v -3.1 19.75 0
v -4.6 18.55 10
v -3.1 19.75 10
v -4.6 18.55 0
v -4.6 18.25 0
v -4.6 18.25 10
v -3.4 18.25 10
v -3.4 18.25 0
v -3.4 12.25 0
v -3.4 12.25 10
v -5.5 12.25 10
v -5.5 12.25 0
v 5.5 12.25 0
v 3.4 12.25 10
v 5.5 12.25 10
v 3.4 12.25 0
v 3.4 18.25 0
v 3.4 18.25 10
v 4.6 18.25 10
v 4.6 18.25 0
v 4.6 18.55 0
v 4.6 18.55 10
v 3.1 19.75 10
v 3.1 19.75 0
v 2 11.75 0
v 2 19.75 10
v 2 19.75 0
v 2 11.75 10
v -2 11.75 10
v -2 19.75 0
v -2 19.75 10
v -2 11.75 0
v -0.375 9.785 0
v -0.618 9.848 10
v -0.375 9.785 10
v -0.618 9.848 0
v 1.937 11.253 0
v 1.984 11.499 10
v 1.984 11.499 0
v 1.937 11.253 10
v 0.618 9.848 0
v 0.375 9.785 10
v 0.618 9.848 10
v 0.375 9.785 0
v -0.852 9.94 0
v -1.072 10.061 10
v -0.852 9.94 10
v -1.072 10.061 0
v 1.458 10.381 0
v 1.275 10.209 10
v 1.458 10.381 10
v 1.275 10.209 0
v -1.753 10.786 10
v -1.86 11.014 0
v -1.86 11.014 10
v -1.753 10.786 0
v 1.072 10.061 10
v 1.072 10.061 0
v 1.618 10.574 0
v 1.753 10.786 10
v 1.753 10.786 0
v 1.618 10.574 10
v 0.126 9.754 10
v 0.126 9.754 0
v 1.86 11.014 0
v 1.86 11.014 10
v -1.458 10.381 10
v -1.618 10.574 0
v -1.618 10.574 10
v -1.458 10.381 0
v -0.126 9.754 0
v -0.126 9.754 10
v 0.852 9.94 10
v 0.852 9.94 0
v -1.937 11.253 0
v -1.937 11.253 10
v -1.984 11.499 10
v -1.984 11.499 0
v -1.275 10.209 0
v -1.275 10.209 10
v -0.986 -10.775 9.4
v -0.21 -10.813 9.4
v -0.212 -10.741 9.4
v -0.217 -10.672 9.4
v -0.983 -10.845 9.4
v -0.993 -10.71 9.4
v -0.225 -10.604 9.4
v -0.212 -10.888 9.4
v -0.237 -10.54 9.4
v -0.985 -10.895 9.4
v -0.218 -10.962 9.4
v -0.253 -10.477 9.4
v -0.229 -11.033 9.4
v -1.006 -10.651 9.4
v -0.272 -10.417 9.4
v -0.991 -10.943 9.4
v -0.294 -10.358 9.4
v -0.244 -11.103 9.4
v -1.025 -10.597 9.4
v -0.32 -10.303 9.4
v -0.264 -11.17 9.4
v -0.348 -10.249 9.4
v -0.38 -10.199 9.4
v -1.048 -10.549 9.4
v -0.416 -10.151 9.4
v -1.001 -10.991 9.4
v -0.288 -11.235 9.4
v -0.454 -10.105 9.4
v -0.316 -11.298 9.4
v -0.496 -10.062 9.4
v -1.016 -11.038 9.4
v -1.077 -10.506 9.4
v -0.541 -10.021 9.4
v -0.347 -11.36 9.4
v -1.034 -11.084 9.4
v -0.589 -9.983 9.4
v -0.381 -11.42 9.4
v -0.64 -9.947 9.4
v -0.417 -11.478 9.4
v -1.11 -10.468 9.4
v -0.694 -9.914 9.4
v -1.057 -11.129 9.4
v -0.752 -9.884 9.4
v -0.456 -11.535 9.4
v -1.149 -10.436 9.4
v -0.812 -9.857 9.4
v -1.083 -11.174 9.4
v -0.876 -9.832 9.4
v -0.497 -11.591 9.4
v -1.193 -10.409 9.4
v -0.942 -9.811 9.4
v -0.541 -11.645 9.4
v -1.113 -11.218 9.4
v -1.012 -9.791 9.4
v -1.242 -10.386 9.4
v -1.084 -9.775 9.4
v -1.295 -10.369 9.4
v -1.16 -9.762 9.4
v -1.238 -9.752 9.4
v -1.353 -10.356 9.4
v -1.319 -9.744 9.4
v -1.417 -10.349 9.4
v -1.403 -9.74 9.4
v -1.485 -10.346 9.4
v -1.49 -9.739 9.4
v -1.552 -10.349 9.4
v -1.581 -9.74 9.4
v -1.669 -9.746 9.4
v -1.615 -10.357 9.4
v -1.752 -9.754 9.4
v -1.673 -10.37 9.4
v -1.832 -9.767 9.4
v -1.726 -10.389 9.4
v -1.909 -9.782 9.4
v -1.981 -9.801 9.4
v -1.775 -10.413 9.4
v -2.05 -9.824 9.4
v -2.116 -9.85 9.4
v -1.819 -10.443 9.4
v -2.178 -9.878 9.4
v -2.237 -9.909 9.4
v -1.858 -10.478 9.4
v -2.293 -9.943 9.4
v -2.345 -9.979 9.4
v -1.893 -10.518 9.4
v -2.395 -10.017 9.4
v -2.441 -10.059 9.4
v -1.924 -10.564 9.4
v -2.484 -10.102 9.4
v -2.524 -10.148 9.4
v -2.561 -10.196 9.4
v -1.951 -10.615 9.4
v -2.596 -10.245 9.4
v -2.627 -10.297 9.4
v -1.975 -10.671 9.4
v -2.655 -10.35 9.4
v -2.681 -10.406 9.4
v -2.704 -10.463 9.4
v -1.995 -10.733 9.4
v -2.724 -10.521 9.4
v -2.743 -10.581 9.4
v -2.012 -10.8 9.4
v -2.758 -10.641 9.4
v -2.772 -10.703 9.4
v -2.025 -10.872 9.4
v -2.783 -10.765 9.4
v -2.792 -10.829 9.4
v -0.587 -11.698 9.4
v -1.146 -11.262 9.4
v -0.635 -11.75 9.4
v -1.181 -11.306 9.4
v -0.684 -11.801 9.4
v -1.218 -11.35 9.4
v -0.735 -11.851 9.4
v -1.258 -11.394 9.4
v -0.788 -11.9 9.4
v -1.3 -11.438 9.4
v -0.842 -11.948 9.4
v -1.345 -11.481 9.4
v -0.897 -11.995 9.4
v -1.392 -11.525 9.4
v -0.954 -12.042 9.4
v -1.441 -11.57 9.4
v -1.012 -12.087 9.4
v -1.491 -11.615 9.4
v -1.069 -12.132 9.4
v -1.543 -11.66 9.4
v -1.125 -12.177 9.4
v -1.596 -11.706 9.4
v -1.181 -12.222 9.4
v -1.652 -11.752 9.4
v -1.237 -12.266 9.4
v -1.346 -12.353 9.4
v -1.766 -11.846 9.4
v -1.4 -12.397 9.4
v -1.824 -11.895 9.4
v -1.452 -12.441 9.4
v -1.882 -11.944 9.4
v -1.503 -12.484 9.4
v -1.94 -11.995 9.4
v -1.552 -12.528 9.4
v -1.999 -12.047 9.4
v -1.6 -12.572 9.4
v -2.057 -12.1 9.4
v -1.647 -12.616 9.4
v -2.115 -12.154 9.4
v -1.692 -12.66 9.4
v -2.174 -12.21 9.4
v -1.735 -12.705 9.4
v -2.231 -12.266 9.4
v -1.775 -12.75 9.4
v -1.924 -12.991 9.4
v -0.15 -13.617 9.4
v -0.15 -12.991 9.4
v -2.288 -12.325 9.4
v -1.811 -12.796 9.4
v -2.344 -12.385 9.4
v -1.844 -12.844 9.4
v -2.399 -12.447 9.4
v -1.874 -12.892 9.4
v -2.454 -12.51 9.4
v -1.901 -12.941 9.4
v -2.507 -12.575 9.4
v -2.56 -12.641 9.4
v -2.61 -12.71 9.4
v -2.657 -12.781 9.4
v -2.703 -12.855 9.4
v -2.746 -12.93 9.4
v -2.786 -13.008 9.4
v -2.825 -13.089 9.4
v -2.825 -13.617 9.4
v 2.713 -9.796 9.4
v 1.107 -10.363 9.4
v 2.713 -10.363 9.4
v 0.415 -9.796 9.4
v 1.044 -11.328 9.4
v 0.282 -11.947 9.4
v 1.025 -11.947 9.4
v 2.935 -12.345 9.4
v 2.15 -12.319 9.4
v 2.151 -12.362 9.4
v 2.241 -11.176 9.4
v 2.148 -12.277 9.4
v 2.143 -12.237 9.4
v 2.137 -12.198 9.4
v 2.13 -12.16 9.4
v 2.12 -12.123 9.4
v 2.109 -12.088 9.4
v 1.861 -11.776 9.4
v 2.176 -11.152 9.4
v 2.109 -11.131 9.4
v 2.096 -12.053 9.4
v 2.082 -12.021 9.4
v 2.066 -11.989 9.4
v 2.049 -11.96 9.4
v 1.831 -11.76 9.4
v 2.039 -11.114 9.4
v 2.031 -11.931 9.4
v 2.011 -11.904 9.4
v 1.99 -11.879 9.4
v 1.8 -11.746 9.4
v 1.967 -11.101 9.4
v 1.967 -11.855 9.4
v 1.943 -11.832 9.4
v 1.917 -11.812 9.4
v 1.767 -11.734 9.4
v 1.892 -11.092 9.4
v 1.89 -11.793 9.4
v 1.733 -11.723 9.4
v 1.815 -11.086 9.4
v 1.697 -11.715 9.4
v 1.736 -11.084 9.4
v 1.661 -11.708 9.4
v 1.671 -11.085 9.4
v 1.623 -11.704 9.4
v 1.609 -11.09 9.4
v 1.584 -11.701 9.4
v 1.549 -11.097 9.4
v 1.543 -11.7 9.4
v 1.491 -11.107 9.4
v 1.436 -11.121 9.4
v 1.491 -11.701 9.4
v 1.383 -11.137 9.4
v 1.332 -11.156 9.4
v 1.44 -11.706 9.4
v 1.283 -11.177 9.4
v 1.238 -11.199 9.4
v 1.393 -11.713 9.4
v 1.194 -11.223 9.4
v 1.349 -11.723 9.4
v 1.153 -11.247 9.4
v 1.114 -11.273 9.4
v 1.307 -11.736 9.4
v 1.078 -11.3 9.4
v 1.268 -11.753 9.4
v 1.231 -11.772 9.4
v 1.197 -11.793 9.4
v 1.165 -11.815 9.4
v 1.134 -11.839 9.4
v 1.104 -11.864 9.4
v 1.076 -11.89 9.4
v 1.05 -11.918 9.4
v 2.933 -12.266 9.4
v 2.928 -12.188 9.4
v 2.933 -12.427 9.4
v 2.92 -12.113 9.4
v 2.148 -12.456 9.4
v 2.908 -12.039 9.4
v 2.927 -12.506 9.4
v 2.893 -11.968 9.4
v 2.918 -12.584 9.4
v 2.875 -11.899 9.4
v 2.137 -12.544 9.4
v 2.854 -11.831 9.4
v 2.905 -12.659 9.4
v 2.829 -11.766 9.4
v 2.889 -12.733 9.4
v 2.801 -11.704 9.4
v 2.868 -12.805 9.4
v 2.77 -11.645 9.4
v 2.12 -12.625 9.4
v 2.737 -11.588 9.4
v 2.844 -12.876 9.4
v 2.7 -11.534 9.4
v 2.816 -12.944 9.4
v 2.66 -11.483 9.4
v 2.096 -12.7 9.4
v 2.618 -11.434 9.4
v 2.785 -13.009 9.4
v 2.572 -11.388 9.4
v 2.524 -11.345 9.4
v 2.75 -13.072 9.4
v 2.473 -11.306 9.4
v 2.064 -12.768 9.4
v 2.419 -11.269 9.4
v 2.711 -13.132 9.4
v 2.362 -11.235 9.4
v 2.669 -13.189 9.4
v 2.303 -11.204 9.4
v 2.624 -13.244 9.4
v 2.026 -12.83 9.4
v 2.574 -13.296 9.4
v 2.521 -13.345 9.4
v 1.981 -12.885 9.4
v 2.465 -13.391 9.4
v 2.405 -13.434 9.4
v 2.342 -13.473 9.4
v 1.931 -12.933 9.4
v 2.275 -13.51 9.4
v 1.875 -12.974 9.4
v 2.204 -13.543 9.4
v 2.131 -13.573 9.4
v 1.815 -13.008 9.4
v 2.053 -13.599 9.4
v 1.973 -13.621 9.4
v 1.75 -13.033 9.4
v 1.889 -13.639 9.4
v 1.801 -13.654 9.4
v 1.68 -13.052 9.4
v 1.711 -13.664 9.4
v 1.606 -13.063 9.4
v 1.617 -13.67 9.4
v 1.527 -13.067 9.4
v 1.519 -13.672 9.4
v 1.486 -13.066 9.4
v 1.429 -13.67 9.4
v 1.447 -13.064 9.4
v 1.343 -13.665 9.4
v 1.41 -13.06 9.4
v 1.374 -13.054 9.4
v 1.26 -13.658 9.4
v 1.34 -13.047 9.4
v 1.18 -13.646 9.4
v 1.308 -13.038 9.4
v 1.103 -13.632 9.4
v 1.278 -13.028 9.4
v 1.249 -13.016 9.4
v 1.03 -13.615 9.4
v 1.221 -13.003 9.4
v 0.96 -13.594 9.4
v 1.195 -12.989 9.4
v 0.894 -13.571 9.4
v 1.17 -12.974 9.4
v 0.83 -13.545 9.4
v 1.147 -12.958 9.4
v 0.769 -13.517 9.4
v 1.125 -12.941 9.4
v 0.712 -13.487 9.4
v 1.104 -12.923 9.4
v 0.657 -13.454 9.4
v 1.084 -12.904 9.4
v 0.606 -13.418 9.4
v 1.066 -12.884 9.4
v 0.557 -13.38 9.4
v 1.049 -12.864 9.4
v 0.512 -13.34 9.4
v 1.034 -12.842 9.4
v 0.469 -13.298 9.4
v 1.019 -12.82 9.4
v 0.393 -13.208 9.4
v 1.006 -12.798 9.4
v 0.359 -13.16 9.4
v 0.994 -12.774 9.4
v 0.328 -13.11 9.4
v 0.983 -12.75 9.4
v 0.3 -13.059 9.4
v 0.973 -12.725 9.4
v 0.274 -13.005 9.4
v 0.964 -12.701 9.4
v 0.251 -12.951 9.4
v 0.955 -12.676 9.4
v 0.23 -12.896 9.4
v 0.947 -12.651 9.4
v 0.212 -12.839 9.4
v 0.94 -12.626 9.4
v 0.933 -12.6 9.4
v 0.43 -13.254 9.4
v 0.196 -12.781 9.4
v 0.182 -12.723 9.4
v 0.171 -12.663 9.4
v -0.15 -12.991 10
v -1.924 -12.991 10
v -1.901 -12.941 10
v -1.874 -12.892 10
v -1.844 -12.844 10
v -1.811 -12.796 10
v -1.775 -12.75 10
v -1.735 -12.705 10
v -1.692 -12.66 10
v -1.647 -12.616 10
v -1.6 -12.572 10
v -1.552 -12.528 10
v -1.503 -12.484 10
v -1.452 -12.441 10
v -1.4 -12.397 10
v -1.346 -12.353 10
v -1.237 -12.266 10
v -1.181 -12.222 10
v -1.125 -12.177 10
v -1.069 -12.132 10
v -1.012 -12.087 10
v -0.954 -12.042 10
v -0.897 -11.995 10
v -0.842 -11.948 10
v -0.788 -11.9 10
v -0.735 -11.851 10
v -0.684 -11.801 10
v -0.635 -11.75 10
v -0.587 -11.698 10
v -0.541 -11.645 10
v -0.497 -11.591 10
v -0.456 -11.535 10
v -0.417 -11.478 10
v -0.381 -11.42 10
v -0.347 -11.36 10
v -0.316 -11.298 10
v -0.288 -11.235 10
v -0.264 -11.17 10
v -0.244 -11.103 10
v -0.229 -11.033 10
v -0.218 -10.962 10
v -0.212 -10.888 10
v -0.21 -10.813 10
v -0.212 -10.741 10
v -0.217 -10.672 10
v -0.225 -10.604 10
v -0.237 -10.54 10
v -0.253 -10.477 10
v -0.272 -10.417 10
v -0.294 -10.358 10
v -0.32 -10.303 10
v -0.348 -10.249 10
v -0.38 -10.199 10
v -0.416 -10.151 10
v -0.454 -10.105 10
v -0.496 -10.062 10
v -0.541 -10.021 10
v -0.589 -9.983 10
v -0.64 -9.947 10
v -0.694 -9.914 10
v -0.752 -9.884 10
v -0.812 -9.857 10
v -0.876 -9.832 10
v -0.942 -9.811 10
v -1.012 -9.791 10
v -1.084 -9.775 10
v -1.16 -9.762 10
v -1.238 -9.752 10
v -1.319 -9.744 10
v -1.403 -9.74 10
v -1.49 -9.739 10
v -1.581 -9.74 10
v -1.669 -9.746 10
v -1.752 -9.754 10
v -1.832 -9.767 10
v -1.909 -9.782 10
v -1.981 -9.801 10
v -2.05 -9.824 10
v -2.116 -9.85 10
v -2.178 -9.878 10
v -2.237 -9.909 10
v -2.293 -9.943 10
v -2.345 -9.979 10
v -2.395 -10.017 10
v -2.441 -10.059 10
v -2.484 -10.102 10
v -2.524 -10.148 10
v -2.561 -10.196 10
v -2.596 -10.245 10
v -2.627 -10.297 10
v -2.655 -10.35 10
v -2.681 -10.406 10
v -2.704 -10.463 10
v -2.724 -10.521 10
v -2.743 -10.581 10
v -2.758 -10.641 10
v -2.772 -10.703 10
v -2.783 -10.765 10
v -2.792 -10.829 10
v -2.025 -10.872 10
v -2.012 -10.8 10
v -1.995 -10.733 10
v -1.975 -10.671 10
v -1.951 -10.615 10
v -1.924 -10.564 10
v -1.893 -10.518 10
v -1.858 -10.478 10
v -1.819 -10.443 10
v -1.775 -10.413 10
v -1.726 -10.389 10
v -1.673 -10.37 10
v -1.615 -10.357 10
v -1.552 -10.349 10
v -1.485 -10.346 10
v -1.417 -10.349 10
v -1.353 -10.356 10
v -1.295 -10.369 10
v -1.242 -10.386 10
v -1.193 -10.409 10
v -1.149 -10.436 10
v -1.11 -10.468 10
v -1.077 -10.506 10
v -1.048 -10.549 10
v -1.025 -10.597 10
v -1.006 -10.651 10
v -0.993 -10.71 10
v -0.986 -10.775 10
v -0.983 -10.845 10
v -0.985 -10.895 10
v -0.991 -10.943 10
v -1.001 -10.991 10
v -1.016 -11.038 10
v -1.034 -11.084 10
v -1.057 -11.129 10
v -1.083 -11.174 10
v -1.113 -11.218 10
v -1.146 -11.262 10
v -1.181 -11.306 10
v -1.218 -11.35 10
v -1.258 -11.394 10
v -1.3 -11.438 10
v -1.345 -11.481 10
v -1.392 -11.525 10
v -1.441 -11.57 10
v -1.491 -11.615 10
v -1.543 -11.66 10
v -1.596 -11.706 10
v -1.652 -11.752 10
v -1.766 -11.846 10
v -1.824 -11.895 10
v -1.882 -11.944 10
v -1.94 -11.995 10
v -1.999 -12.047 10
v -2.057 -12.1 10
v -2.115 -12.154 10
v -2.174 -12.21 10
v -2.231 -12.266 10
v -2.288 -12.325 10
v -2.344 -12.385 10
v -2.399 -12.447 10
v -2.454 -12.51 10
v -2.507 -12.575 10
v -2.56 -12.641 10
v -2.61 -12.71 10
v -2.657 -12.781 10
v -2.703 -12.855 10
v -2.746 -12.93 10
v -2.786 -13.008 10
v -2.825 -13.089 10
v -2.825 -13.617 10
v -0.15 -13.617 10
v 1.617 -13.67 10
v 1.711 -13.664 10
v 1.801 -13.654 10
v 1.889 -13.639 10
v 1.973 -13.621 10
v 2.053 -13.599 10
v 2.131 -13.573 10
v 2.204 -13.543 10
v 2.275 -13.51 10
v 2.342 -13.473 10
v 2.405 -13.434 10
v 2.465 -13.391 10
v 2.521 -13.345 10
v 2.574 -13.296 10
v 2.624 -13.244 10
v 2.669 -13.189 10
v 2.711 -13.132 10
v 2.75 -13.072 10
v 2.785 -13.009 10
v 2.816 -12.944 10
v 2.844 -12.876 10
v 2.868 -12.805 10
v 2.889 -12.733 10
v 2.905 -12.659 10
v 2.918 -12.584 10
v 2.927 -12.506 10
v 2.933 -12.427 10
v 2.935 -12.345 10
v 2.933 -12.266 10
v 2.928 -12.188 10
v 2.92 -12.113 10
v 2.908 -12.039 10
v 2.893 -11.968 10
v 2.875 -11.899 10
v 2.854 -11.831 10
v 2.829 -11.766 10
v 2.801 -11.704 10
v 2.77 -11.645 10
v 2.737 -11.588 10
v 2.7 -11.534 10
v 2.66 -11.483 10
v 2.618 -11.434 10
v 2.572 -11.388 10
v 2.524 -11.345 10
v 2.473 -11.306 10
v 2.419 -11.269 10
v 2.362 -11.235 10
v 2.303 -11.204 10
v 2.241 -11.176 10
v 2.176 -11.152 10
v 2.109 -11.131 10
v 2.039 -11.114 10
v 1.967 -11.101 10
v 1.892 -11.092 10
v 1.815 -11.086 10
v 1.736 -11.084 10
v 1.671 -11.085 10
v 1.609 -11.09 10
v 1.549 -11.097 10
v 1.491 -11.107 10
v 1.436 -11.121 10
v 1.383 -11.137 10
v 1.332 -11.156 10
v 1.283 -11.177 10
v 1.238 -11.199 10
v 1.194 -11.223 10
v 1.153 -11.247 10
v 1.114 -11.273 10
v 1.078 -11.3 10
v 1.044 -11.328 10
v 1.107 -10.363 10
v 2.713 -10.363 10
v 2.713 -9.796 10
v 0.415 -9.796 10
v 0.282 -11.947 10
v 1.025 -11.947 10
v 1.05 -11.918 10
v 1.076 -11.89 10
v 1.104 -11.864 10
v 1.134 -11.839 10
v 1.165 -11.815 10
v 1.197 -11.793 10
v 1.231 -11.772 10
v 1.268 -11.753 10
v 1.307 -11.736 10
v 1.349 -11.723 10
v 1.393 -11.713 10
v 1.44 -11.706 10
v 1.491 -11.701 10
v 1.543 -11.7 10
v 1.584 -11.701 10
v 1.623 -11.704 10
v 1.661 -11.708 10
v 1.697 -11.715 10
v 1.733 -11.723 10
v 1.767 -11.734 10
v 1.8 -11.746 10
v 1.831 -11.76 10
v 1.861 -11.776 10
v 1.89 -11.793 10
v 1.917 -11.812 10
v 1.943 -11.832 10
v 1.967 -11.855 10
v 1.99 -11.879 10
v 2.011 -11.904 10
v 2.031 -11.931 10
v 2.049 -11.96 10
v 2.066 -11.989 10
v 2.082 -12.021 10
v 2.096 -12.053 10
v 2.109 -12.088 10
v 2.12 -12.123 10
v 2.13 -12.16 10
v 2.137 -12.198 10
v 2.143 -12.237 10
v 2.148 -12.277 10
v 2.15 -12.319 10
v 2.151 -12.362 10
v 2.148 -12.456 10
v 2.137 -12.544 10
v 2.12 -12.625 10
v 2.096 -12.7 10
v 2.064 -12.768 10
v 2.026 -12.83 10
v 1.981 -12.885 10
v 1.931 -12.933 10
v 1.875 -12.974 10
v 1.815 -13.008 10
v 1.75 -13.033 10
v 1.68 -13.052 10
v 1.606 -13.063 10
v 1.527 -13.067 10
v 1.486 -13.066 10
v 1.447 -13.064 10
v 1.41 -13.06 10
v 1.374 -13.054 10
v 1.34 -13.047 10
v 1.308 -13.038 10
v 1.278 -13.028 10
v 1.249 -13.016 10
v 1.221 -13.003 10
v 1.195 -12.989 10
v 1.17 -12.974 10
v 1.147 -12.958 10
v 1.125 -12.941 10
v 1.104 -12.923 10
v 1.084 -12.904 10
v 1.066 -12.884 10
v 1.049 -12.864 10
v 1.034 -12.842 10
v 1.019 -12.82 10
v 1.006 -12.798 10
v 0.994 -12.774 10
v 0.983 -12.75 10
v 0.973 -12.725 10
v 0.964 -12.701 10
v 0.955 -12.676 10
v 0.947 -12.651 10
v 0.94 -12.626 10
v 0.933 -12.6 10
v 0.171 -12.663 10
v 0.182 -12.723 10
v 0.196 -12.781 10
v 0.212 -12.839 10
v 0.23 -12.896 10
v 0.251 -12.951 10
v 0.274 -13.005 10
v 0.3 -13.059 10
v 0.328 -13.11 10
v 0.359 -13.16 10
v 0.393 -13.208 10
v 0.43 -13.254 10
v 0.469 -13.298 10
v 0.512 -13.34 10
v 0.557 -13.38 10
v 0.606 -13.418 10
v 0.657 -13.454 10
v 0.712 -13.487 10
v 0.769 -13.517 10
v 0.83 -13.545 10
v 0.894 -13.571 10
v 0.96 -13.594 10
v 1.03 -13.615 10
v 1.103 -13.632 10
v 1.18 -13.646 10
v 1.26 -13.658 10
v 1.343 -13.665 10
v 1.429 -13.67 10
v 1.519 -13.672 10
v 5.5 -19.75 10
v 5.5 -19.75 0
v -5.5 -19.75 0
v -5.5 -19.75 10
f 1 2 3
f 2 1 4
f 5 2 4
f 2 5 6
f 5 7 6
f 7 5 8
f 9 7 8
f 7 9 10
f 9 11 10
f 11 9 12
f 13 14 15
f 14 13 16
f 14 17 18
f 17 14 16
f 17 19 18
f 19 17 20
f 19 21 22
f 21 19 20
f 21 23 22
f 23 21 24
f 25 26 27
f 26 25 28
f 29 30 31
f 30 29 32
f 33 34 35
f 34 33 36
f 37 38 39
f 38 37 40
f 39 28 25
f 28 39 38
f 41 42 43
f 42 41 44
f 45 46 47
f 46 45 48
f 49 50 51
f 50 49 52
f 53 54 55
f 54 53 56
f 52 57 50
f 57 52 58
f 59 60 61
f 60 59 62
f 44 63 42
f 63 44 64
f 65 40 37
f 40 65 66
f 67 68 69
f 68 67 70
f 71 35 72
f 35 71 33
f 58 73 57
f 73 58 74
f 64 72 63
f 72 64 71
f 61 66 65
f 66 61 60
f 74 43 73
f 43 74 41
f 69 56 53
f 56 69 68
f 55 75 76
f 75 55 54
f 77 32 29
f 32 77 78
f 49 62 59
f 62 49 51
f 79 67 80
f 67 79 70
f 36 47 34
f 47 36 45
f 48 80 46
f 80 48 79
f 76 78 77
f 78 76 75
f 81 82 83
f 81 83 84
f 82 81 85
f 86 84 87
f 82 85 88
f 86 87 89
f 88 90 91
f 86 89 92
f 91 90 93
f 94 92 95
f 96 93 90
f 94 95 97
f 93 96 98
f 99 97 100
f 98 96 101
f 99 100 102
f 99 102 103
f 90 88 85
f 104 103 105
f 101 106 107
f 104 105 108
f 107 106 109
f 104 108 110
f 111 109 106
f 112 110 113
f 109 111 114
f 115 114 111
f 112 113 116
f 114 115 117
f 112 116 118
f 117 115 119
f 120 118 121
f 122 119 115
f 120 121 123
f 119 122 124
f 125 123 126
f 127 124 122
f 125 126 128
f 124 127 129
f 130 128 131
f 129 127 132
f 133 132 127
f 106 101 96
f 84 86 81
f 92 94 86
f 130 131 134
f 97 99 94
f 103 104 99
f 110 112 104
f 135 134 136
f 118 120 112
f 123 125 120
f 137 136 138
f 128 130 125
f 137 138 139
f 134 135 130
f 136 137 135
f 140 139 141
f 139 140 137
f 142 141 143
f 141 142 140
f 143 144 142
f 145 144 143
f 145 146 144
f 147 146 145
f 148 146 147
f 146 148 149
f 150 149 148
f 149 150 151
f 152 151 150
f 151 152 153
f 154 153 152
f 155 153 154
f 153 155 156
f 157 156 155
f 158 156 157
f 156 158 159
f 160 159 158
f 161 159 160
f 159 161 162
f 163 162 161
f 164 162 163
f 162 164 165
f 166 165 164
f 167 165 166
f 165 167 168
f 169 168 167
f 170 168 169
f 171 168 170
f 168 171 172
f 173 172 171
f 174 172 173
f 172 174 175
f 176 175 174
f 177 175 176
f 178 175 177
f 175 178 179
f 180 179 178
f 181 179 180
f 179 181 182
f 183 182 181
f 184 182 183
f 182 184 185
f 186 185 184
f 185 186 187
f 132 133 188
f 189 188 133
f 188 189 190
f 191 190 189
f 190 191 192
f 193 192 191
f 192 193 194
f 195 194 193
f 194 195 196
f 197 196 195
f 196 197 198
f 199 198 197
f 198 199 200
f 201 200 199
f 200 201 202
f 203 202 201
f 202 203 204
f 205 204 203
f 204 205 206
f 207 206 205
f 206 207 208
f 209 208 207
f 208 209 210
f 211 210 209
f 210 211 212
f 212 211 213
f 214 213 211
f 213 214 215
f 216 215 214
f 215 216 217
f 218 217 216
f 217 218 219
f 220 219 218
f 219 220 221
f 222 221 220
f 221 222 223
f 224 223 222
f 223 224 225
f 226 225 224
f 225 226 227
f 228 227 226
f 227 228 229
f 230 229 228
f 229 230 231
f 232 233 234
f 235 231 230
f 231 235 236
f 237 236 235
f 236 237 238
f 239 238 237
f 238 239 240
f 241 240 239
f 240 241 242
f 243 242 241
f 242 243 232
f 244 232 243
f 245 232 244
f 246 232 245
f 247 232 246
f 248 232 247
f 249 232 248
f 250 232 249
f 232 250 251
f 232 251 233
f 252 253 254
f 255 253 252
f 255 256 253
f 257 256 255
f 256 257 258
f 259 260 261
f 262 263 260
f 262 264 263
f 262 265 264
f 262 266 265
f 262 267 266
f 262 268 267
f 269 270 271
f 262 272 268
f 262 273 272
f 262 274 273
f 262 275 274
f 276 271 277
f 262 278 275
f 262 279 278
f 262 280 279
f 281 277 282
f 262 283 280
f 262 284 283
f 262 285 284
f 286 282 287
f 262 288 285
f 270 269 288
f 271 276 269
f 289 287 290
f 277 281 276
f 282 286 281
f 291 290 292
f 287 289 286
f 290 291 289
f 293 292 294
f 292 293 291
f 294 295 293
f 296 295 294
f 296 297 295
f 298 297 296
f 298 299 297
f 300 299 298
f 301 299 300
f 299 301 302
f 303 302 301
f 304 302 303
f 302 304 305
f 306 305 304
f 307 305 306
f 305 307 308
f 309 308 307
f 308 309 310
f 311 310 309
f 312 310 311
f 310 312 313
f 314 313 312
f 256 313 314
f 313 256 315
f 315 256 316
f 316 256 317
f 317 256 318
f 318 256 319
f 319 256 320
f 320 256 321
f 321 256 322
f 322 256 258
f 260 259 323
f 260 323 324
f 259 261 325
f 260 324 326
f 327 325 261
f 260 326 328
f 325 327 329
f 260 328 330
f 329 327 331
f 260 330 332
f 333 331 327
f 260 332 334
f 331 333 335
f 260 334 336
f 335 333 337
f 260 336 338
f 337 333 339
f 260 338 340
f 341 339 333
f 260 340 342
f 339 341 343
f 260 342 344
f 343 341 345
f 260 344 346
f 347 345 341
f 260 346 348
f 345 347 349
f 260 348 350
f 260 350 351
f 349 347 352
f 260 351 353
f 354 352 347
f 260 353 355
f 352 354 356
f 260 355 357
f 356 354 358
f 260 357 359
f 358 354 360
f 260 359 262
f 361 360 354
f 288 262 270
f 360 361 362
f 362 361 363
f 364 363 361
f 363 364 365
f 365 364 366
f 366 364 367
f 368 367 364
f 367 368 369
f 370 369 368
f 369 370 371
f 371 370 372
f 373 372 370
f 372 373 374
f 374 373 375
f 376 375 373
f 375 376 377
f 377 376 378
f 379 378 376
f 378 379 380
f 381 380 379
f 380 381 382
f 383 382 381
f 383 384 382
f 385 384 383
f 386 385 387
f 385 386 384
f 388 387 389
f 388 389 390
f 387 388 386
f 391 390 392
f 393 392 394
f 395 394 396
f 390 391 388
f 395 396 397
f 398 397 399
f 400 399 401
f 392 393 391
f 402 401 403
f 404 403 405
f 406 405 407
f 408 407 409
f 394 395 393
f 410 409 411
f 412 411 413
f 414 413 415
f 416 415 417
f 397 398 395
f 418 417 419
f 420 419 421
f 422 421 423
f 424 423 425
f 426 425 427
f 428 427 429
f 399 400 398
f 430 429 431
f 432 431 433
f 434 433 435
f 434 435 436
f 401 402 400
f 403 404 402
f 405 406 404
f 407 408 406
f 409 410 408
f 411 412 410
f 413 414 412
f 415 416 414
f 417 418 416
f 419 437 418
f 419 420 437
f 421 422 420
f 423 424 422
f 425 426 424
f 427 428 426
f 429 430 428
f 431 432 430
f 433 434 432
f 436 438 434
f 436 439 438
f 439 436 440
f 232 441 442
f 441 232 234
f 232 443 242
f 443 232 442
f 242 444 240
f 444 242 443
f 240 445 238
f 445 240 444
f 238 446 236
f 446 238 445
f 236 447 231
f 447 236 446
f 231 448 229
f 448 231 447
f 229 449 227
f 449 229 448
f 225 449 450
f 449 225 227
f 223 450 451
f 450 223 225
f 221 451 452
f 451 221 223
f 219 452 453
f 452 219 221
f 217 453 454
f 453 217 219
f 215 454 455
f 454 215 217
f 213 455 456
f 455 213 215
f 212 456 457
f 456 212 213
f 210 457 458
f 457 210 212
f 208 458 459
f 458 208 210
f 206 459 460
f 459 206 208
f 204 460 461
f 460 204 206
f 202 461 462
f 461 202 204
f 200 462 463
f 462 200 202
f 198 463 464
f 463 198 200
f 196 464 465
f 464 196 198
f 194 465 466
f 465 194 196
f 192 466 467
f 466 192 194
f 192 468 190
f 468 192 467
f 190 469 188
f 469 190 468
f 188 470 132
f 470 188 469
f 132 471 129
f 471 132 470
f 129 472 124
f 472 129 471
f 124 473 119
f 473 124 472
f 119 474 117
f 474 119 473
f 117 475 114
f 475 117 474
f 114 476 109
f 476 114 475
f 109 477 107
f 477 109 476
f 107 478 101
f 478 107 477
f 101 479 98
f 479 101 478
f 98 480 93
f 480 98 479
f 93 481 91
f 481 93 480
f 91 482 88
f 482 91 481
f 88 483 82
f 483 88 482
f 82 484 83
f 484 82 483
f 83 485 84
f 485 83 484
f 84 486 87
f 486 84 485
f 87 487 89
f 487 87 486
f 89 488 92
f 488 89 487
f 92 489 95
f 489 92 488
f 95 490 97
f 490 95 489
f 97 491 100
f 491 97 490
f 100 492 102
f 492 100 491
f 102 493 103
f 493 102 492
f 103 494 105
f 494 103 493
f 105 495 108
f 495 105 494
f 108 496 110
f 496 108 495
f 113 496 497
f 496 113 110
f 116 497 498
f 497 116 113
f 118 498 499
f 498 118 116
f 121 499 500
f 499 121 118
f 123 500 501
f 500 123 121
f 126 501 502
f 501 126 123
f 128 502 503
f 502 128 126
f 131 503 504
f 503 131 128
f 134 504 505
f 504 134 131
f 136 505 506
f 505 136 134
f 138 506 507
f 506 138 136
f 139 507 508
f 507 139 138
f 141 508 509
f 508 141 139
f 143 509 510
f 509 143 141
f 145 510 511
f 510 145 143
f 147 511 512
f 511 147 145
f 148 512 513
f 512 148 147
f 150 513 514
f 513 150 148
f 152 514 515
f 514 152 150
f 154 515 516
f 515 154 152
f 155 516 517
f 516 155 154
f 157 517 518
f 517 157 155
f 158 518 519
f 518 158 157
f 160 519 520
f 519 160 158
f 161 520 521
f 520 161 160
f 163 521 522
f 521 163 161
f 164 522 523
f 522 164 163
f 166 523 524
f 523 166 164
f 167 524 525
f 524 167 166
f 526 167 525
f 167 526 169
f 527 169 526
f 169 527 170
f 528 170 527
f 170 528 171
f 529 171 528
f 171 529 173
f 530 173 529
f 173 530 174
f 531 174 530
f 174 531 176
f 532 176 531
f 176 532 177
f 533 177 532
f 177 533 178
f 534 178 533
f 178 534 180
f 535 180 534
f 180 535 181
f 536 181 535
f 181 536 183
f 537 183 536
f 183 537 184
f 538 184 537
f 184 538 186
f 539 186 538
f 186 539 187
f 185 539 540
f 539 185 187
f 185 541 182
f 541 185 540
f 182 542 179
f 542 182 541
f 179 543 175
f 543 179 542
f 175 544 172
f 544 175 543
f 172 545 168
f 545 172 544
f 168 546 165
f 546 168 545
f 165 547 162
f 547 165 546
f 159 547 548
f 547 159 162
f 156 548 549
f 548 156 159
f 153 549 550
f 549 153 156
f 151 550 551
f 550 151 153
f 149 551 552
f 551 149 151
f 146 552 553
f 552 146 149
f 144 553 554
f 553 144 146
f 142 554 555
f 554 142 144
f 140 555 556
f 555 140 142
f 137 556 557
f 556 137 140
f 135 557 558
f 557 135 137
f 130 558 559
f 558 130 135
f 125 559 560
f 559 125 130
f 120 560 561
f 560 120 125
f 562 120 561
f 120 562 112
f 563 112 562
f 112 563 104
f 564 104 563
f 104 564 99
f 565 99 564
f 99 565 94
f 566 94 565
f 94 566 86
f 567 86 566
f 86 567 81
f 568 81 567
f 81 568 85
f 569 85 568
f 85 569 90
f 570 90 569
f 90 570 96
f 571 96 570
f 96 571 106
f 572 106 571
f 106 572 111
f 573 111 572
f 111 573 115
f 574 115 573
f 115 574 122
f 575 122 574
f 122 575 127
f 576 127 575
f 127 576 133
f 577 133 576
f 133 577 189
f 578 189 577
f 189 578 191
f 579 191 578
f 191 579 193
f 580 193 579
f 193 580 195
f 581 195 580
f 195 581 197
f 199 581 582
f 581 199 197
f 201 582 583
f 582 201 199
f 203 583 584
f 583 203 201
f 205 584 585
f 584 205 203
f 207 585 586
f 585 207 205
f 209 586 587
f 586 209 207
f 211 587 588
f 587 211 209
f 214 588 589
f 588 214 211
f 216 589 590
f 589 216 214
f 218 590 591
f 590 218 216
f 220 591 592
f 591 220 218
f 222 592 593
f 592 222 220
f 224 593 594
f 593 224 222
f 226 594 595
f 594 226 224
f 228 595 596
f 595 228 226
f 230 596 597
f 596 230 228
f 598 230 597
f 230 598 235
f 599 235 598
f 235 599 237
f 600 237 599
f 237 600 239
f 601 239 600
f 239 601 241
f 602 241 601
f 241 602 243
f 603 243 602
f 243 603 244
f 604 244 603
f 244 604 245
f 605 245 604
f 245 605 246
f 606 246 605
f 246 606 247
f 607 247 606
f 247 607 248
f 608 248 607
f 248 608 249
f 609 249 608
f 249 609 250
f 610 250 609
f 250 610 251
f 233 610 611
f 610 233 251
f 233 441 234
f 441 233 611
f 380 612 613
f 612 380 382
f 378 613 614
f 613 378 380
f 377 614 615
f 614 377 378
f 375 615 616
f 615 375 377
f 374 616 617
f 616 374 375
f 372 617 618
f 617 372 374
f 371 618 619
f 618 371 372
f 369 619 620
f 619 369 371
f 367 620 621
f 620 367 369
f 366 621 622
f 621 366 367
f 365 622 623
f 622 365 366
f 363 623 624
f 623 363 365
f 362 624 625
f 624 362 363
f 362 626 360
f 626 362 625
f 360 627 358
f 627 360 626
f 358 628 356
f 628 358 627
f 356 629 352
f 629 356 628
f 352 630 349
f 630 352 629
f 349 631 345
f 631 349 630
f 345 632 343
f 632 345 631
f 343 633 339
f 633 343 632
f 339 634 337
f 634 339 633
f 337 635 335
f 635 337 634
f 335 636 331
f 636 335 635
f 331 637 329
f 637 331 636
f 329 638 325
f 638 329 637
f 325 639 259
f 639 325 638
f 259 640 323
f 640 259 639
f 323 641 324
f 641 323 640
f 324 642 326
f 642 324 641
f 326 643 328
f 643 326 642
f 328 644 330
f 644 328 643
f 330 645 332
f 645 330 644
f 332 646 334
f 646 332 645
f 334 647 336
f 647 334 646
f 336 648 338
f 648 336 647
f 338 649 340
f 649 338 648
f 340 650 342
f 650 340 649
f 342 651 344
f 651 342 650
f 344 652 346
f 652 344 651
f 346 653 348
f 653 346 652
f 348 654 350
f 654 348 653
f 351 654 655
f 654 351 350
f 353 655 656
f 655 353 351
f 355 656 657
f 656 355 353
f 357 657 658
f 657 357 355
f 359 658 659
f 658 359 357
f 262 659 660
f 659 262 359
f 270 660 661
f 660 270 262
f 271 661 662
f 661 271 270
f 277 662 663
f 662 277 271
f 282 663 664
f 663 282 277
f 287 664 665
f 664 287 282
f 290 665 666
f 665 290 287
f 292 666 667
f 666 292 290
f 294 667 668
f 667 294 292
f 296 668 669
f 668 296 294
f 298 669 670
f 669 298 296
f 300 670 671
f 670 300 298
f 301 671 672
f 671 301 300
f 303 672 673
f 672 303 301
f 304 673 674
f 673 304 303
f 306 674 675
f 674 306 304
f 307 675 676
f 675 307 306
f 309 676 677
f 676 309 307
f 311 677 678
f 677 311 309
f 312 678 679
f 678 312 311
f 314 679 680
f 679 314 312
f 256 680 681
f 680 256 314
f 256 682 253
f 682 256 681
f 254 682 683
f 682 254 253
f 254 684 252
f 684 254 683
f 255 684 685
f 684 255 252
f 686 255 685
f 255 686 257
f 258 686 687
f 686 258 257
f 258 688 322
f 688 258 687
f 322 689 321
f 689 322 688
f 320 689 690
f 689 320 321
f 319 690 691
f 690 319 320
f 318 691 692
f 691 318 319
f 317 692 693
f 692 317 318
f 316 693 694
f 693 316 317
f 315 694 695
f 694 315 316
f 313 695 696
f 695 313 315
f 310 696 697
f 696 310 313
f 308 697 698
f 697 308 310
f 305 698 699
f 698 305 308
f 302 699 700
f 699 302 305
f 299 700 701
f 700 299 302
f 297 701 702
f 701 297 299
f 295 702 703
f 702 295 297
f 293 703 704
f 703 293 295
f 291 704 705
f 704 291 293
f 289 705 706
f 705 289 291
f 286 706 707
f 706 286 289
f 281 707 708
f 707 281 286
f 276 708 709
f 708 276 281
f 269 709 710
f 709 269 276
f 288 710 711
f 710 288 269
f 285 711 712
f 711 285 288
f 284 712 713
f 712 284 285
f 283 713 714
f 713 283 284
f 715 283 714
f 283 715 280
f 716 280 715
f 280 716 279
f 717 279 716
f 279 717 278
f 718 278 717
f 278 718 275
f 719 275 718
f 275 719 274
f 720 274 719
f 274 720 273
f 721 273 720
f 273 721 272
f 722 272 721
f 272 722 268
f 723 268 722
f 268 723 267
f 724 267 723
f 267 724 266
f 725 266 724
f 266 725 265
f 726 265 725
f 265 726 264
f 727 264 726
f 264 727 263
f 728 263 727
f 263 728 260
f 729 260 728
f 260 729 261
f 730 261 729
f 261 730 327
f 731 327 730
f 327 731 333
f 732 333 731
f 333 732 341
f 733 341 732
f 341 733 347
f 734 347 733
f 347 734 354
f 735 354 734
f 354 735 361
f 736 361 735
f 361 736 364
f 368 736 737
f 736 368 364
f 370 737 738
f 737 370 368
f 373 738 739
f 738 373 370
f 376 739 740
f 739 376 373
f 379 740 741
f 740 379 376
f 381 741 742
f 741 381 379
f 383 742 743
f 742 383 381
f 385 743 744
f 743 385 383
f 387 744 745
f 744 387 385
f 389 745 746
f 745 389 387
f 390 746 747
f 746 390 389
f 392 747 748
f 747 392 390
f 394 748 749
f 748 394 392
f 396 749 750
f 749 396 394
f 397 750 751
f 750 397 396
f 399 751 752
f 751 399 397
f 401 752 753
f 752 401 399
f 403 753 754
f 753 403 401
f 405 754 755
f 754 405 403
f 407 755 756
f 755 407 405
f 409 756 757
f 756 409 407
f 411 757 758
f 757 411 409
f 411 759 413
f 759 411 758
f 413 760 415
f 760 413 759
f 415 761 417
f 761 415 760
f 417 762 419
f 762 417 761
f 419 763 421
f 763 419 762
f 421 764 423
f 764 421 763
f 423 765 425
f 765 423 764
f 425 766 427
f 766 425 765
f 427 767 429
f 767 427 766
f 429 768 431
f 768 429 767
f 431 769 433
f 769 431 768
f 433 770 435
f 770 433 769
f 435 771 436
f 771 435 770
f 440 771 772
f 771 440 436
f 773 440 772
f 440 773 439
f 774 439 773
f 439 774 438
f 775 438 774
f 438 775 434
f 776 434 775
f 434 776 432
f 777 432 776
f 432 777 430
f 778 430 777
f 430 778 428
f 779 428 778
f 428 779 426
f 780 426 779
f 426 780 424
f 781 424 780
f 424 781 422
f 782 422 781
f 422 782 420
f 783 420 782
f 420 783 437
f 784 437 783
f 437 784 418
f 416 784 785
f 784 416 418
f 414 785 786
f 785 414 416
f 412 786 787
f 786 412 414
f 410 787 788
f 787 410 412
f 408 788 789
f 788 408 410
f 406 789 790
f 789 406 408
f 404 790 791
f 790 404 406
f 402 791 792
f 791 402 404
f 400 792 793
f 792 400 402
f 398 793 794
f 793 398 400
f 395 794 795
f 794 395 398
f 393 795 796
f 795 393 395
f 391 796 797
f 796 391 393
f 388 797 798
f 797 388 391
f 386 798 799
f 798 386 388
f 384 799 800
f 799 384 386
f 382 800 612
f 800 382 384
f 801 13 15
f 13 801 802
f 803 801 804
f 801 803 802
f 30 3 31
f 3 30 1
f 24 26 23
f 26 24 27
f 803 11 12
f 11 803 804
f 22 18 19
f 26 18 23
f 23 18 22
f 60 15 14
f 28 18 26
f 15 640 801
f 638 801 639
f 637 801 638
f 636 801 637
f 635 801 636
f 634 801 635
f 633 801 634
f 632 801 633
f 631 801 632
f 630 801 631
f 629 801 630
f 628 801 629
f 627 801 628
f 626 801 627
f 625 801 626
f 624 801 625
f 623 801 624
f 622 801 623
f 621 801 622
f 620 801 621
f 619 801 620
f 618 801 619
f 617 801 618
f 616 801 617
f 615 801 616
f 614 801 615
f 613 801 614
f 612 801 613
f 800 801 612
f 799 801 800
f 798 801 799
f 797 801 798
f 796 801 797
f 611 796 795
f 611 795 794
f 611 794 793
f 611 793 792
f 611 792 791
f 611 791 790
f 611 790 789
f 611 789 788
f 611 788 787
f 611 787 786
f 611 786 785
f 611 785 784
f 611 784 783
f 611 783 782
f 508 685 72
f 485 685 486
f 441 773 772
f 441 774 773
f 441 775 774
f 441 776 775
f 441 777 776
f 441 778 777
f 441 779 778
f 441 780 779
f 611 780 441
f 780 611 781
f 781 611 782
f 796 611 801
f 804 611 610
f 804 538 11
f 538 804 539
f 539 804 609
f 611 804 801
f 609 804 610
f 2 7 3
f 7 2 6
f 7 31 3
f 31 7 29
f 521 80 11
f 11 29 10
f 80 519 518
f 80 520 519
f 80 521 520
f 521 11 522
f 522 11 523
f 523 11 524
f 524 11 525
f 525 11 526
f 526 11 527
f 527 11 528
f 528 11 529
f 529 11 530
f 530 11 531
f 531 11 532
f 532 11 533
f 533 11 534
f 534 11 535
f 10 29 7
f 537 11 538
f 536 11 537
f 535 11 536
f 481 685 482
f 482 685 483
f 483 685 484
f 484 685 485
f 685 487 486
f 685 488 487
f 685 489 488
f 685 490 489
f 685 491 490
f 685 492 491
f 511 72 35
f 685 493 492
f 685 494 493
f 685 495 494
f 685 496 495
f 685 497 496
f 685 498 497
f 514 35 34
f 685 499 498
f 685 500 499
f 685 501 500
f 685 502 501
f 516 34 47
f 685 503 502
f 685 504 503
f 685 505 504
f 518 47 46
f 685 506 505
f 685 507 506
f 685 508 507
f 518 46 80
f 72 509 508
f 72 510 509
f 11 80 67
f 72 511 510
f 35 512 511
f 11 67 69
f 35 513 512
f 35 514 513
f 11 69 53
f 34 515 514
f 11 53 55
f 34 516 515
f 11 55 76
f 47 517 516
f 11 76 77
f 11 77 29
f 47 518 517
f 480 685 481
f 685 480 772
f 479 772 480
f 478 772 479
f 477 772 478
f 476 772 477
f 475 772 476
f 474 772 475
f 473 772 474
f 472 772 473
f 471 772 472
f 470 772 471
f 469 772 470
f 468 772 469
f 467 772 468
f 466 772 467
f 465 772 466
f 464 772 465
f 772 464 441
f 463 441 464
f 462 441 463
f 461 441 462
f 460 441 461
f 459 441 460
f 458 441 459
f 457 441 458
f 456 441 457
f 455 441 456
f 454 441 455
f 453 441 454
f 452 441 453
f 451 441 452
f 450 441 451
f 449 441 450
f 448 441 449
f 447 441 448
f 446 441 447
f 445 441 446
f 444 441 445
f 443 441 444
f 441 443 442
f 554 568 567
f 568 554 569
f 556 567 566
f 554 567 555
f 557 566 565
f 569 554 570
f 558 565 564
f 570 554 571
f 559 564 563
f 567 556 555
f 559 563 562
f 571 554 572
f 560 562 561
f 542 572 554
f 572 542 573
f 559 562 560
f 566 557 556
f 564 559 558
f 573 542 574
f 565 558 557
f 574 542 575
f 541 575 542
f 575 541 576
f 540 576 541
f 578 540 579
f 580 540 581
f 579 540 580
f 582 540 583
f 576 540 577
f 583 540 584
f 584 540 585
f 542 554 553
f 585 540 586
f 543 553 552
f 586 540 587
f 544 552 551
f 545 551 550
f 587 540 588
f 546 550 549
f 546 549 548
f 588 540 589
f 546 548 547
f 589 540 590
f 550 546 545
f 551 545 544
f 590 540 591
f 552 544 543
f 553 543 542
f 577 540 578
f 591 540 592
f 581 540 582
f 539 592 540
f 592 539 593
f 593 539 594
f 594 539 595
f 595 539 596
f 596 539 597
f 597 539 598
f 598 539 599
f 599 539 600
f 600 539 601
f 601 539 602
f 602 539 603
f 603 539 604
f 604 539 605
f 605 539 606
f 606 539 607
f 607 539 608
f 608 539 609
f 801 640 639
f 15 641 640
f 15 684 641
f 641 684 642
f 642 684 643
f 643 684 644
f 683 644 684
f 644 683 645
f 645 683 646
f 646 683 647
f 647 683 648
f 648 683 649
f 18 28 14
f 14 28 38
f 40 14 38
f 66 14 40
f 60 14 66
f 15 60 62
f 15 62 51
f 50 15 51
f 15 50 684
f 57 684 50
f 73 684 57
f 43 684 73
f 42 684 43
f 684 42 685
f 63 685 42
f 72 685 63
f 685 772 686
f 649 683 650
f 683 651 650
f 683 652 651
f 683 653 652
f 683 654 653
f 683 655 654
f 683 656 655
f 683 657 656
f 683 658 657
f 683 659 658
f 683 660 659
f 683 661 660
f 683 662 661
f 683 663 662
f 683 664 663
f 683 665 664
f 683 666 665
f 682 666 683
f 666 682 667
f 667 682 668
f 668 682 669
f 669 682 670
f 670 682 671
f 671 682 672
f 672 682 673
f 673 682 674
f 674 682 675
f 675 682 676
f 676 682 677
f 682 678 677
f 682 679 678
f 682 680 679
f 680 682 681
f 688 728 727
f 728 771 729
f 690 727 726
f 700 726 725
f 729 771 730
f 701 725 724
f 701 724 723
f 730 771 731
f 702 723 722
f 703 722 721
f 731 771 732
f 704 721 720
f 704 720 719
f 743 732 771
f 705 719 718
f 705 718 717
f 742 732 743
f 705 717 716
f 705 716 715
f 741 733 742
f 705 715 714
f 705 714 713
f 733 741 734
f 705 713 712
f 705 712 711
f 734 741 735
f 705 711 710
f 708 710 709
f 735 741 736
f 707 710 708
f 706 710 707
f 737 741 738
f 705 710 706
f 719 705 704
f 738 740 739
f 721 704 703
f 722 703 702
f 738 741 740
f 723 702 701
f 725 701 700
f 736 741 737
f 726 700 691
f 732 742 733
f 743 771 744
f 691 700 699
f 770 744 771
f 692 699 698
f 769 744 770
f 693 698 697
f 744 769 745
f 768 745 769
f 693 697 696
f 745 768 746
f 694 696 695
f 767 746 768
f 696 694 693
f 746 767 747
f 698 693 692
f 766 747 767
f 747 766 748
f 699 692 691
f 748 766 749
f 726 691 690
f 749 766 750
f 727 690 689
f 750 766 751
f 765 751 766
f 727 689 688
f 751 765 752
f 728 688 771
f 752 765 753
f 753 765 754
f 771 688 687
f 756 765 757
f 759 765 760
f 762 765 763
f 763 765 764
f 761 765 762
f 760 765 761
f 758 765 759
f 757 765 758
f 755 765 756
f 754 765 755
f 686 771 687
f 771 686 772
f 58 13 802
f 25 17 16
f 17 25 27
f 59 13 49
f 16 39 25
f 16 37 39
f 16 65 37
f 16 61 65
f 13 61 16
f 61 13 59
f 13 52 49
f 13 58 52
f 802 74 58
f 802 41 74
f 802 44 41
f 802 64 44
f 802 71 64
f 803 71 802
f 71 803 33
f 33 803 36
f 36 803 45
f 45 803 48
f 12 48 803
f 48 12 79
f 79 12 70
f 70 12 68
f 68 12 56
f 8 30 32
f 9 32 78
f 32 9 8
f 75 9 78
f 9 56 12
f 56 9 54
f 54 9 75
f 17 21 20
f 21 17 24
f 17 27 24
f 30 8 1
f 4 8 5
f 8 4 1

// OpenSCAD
$fn = 50;

difference() {
	union() {
		translate(v = [0, 12.25, 0]) {
			rotate(a = [90, 0, 0]) {
				difference() {
					union() {
						translate(v = [-5.5, 0, -7.5]) {
							cube(size = [11.0, 10.0, 39.5]);
						}
					}
					union() {
						translate(v = [0, 10.1, 0]) {
							rotate(a = [90, 0, 0]) {
								linear_extrude(height = 10.2) {
									polygon(points = [[-3.1, -7.6], [-3.1, -7.5], [-4.6, -6.3], [-4.6, -6.0], [-3.4, -6.0], [-3.4, 0], [-5.6, 0], [-5.6, -7.6]]);
								}
							}
						}
						translate(v = [0, 10.1, 0]) {
							rotate(a = [90, 0, 0]) {
								linear_extrude(height = 10.2) {
									polygon(points = [[3.1, -7.6], [3.1, -7.5], [4.6, -6.3], [4.6, -6.0], [3.4, -6.0], [3.4, 0], [5.6, 0], [5.6, -7.6]]);
								}
							}
						}
						translate(v = [-2.0, -0.1, -7.6]) {
							cube(size = [4.0, 10.2, 8.1]);
						}
						translate(v = [0, 10.1, 0.5]) {
							rotate(a = [90, 0, 0]) {
								cylinder(h = 10.2, r = 2.0);
							}
						}
						translate(v = [0, 9.4, 24.0]) {
							rotate(a = [-90, 0, 0]) {
								linear_extrude(height = 0.7) {
									text(font = "Arial:style=Bold", halign = "center", size = 4.0, text = "25", valign = "center");
								}
							}
						}
					}
				}
			}
		}
	}
	union();
}
